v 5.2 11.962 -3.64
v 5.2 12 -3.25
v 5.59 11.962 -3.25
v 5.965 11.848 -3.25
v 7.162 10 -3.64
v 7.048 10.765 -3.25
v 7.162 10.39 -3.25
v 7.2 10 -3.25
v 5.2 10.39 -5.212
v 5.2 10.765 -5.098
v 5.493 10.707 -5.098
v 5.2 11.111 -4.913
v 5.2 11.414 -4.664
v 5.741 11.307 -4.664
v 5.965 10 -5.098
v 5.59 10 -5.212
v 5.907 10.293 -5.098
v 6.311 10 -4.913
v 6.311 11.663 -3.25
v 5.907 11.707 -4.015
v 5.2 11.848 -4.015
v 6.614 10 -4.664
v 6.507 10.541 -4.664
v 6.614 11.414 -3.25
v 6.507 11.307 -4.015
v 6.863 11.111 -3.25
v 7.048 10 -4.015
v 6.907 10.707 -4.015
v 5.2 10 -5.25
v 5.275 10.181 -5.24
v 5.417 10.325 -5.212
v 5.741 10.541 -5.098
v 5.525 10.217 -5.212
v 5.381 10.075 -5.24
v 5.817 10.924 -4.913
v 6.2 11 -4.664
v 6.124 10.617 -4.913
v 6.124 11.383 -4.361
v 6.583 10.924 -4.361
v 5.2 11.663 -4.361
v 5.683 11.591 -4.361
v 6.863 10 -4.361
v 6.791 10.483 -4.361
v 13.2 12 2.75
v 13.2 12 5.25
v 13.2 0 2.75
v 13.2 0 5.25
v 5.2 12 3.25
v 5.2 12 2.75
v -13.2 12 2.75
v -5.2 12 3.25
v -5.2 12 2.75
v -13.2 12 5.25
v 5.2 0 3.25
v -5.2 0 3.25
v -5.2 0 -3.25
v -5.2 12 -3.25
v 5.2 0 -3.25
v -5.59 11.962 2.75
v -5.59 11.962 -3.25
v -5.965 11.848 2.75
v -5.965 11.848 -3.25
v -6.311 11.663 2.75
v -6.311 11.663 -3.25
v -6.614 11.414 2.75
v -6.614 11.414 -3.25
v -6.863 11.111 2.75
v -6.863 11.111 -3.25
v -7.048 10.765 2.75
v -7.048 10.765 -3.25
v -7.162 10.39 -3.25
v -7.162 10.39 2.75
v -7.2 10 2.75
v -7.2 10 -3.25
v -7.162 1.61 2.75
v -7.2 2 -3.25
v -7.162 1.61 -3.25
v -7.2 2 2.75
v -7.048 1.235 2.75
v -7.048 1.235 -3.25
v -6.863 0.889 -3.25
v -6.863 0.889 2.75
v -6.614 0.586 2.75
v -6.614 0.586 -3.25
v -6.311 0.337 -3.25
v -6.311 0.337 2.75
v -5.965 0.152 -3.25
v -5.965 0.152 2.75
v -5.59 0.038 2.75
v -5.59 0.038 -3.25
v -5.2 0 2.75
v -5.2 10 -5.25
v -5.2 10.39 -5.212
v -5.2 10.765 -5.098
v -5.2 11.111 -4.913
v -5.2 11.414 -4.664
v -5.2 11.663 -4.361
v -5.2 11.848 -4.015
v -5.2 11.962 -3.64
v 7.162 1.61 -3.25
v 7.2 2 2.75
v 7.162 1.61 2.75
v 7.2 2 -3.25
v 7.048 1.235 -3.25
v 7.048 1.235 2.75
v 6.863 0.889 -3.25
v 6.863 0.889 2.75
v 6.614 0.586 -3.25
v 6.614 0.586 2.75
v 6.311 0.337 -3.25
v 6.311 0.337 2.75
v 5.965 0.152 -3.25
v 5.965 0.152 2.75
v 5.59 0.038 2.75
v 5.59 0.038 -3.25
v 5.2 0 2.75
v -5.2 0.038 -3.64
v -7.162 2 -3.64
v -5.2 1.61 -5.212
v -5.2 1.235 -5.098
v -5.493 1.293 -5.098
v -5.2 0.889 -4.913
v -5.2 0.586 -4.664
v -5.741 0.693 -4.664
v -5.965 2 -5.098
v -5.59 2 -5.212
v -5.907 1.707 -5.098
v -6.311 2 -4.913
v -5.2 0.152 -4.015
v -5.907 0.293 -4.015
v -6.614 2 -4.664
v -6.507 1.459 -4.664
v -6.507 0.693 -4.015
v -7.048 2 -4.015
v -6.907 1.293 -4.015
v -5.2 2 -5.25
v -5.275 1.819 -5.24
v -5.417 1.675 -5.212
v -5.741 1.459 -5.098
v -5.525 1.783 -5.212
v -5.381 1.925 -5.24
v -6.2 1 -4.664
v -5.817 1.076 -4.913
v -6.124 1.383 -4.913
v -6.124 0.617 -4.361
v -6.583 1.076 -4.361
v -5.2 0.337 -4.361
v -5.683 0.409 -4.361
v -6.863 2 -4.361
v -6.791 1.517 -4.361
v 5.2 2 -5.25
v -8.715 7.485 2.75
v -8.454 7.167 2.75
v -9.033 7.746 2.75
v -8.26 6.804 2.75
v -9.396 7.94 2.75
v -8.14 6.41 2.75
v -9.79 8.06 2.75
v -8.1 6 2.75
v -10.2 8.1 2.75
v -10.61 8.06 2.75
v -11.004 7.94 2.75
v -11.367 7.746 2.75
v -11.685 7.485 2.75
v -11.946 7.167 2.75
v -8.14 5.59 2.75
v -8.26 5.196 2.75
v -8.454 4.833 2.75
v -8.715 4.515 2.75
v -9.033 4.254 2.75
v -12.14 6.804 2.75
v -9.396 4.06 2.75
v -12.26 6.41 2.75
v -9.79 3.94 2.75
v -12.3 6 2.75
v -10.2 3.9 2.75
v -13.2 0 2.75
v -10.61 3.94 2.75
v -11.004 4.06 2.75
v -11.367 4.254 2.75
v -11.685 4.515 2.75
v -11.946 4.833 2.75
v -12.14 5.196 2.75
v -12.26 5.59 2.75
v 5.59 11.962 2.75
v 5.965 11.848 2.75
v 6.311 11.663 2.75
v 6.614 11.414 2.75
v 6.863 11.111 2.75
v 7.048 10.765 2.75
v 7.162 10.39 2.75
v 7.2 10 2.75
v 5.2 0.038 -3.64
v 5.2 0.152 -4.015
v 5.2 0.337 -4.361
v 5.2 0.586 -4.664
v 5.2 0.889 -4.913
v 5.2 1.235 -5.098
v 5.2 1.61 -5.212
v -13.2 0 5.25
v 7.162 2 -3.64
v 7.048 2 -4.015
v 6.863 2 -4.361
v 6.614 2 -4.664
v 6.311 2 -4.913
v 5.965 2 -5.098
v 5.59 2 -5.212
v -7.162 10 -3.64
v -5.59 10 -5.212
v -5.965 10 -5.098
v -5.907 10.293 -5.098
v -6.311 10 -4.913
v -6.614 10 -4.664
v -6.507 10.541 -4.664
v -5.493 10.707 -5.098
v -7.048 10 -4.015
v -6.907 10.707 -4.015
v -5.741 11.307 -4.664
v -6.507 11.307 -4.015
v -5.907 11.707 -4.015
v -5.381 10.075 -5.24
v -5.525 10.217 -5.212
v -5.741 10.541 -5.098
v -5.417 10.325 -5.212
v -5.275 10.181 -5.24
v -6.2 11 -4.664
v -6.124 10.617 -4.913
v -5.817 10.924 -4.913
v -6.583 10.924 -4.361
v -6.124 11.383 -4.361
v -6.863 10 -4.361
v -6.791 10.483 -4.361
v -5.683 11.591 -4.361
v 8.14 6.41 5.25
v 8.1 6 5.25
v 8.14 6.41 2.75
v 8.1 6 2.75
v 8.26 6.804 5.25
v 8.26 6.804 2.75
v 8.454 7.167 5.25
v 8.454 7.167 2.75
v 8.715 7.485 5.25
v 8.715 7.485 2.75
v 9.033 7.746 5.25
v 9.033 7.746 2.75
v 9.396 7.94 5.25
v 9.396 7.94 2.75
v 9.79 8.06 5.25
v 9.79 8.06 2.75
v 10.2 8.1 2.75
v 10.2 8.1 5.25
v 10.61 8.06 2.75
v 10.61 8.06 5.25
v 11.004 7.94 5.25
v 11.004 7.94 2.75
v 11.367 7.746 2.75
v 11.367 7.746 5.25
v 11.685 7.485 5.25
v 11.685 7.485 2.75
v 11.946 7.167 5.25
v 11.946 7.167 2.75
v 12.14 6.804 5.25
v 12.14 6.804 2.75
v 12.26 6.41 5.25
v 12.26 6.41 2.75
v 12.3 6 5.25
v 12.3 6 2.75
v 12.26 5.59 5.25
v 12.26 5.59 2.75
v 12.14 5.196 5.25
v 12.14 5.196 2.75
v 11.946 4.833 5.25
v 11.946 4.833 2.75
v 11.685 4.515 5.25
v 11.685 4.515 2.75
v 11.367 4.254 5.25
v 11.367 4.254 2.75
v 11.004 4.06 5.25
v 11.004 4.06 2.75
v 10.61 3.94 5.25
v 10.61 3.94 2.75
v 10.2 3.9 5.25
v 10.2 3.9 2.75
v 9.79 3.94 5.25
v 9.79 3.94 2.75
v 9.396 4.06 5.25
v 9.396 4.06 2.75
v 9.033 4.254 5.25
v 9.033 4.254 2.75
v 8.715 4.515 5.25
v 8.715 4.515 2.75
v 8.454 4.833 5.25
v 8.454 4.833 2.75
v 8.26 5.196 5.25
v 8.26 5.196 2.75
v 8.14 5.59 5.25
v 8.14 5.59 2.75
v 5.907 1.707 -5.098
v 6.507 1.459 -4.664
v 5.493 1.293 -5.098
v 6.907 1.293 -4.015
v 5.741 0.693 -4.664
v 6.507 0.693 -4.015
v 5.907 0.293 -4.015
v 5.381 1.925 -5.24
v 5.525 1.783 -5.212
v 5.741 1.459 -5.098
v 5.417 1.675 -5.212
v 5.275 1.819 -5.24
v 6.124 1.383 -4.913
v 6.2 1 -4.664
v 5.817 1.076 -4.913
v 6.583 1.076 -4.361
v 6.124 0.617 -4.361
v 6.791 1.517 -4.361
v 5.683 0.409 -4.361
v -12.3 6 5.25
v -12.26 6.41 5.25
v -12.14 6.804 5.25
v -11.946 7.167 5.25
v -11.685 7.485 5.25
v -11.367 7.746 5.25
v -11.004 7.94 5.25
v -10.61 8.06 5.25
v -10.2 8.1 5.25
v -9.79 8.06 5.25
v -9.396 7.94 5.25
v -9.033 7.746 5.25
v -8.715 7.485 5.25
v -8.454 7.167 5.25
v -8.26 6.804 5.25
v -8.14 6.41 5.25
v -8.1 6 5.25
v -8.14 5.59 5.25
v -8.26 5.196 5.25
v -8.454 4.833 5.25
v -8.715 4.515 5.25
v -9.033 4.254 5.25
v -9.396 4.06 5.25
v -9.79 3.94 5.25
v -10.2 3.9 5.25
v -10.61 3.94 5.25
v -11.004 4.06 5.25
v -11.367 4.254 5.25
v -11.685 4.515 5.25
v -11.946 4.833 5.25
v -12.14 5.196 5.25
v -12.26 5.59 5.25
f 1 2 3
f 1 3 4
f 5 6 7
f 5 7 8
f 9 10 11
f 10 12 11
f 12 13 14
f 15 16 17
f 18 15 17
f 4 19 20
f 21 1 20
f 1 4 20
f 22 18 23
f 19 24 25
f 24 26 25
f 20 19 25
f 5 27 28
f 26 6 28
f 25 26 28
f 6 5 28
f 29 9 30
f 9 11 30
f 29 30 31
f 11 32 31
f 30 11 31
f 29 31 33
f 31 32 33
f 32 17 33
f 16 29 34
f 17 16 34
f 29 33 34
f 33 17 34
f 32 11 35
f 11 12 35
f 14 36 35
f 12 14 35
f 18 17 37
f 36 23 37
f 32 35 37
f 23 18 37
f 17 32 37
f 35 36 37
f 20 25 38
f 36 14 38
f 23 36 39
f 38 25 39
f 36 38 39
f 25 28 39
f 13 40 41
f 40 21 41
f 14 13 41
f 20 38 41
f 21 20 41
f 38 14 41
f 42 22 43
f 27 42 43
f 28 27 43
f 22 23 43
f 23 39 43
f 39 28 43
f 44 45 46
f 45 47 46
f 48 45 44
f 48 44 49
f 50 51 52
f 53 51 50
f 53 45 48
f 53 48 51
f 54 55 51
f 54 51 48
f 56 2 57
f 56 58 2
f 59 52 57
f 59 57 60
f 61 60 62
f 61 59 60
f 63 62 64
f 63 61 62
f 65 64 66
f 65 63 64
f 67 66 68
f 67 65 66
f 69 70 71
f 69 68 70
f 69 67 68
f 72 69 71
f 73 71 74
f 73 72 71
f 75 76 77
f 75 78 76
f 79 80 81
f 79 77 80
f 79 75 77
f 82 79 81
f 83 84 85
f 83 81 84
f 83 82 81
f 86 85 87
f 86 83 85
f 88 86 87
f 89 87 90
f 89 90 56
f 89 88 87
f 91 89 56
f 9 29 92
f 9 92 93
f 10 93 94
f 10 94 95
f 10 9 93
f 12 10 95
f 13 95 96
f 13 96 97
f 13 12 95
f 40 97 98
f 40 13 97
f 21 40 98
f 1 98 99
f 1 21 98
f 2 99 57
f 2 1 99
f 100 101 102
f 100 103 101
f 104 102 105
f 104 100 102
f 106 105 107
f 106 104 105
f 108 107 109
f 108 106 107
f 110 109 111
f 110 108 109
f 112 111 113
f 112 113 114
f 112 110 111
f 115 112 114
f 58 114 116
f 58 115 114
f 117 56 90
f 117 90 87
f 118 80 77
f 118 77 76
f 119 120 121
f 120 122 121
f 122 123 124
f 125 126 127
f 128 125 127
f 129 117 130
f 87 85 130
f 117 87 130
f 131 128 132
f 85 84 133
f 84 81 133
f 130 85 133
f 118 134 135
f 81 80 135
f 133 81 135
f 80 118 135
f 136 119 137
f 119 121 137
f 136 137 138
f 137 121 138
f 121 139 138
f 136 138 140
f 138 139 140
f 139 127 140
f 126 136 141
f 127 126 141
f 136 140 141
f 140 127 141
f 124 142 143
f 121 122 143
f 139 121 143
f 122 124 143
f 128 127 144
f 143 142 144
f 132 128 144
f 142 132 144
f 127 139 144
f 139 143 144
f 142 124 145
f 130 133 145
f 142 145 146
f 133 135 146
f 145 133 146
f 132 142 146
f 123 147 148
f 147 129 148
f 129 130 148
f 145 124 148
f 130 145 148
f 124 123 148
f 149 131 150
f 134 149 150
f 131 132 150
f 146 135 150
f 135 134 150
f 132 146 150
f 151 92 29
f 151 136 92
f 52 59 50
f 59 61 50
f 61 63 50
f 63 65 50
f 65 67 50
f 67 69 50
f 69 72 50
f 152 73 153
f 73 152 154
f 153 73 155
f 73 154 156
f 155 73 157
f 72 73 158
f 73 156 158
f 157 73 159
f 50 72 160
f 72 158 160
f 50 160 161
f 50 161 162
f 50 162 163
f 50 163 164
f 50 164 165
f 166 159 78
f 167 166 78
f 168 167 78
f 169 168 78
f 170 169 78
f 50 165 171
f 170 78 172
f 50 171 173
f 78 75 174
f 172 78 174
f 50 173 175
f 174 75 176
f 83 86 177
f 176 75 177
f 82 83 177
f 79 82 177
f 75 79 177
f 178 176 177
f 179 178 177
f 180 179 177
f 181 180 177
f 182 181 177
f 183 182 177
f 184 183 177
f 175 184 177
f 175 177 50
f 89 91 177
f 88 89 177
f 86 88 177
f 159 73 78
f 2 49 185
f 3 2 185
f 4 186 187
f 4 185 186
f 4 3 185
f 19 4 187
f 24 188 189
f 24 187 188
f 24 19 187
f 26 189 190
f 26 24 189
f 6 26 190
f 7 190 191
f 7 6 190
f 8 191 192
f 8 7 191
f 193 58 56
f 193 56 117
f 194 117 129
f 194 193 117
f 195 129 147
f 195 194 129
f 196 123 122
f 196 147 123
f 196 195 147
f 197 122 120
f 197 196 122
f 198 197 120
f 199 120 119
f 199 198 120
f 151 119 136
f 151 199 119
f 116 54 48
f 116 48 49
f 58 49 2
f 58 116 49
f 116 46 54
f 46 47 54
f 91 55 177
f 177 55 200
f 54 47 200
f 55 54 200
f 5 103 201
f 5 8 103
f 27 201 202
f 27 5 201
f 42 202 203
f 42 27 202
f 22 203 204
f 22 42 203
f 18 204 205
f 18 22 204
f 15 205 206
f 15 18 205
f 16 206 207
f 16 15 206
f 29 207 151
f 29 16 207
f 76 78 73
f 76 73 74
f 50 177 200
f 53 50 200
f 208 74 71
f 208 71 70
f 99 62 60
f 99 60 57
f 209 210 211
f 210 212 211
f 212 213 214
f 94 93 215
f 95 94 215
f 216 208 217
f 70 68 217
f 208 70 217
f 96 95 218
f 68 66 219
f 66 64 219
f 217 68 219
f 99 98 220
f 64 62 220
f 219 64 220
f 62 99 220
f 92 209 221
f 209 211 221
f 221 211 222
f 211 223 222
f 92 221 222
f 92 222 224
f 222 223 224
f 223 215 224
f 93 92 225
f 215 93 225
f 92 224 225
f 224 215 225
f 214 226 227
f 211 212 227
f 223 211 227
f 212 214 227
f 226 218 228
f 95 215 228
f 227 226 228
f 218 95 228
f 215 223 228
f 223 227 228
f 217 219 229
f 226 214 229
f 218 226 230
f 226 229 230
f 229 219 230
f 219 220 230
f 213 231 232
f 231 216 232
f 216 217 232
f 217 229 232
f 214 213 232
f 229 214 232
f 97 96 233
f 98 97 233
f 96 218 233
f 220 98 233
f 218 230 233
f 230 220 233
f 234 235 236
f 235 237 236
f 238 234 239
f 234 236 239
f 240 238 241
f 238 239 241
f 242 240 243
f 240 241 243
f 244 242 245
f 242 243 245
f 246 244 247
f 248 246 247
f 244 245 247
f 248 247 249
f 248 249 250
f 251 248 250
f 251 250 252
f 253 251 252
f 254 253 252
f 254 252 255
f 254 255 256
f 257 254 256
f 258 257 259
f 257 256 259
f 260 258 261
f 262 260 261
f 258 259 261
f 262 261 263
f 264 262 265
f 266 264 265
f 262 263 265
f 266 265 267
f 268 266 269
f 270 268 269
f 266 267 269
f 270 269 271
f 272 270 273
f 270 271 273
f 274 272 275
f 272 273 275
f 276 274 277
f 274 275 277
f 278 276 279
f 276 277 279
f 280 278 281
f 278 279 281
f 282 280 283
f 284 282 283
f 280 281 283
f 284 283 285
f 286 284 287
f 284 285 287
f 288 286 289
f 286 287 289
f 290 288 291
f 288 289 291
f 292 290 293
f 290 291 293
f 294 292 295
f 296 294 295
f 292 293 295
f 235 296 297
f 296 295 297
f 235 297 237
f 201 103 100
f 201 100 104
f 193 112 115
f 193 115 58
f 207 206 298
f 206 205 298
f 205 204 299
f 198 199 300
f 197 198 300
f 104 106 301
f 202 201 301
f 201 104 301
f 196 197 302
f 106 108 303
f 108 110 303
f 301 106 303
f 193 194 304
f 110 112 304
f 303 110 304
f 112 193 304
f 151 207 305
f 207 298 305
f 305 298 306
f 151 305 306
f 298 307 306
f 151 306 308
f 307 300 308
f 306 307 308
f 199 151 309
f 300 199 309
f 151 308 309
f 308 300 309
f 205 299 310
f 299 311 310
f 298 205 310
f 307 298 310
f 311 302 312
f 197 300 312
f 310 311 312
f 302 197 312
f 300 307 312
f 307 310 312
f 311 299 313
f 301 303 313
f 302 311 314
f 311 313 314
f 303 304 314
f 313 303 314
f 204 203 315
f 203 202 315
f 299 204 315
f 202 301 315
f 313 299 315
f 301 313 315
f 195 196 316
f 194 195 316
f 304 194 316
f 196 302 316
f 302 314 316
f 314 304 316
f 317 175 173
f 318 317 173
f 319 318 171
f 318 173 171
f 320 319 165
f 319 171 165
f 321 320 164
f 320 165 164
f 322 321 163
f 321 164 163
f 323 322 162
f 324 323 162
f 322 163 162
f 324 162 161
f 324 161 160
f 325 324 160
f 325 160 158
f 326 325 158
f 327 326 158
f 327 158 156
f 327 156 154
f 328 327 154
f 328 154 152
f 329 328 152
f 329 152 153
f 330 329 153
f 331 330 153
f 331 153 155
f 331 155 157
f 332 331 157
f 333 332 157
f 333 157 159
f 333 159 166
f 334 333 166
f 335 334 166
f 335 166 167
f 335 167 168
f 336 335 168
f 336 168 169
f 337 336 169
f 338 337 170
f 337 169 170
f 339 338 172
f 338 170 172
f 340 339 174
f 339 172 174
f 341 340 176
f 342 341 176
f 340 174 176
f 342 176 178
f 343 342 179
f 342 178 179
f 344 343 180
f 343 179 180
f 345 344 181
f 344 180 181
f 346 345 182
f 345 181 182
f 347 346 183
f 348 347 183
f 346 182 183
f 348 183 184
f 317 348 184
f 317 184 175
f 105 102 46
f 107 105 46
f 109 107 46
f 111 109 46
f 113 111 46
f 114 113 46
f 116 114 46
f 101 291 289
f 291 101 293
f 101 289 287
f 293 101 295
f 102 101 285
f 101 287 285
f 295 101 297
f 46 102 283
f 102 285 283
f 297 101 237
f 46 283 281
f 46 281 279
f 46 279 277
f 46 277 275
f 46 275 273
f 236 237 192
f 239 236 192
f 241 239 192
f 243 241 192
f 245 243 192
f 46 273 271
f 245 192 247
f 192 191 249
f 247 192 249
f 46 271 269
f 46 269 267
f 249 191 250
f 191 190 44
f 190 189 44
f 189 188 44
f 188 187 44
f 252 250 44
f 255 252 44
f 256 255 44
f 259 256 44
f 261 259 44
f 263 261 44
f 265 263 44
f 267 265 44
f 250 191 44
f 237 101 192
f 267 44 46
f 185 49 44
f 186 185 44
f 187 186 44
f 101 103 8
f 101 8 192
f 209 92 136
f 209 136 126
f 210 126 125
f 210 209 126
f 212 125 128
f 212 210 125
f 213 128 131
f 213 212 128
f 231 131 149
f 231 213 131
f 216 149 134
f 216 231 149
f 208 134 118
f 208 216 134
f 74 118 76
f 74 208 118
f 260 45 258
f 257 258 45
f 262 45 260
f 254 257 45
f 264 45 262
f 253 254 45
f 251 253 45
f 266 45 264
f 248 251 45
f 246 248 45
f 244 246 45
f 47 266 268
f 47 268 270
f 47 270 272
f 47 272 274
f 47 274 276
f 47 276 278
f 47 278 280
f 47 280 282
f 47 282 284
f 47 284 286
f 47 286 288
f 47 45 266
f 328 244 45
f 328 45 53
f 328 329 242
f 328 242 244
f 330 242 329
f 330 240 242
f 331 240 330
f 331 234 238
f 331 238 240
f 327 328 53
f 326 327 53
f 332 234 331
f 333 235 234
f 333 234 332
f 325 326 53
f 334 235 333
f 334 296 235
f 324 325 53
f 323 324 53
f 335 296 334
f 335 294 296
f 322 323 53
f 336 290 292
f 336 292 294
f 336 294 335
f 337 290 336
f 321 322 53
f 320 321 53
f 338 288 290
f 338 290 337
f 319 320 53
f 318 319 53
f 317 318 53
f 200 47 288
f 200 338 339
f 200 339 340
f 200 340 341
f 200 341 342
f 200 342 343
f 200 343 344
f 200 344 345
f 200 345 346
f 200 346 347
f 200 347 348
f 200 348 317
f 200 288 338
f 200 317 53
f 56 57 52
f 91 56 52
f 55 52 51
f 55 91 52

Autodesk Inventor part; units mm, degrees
ref_plane "YZ Plane" through (0, 0, 0) normal (1, 0, 0) x (0, 1, 0)
ref_plane "XZ Plane" through (0, 0, 0) normal (0, 1, 0) x (-1, 0, 0)
ref_plane "XY Plane" through (0, 0, 0) normal (0, 0, 1) x (1, 0, 0)
sketch "Sketch1" plane through (0, 0, 0) normal (0, 1, 0) x (-1, 0, 0)
  line L0 (5.2, 3.25) -> (-5.2, 3.25)
  line L1 (-5.2, 3.25) -> (-5.2, -3.25)
  line L2 (-5.2, -3.25) -> (5.2, -3.25)
  line L3 (5.2, -3.25) -> (5.2, 3.25)
  line L4 (0, -3.25) -> (0, 3.25) construction
  line L5 (5.2, 0) -> (-5.2, 0) construction
  line L6 (7.2, -5.25) -> (-7.2, -5.25)
  line L7 (-7.2, -5.25) -> (-7.2, 5.25)
  line L8 (-7.2, 5.25) -> (7.2, 5.25)
  line L9 (7.2, 5.25) -> (7.2, -5.25)
  line L10 (-13.2, 2.75) -> (-7.2, 2.75)
  line L11 (-7.2, 2.75) -> (-7.2, 5.25)
  line L12 (-7.2, 5.25) -> (-13.2, 5.25)
  line L13 (-13.2, 5.25) -> (-13.2, 2.75)
  line L14 (7.2, 2.75) -> (13.2, 2.75)
  line L15 (13.2, 2.75) -> (13.2, 5.25)
  line L16 (13.2, 5.25) -> (7.2, 5.25)
  line L17 (7.2, 5.25) -> (7.2, 2.75)
  point P0 (0, 0)
  dimension "d0" = 10.4
  dimension "d1" = 6.5
  dimension "d4" = 2
  dimension "d5" = 2
  dimension "d6" = 2
  dimension "d7" = 2
  dimension "d8" = 2.5
  dimension "d9" = 2.5
  dimension "d10" = 6
  dimension "d11" = 6
extrude "Extrusion2" add sketch "Sketch1" along normal blind 12
sketch "Sketch2" plane through (13.2, 0, 2.75) normal (0, 0, -1) x (-1, 0, 0)
  line L0 (26.4, 0) -> (20.4, 0) construction
  line L1 (20.4, 0) -> (20.4, 12) construction
  line L2 (20.4, 12) -> (26.4, 12) construction
  line L3 (26.4, 12) -> (26.4, 0) construction
  line L4 (20.4, 0) -> (26.4, 0) construction
  line L5 (26.4, 0) -> (26.4, 12) construction
  line L6 (20.4, 0) -> (20.4, 12) construction
  line L7 (20.4, 12) -> (26.4, 12) construction
  line L8 (23.4, 0) -> (23.4, 12) construction
  line L9 (26.4, 6) -> (20.4, 6) construction
  circle A0 centre (15.4635, 5.7038) radius 3.0285
  circle A1 centre (23.4, 6) radius 2.1
  line L10 (13.2, -1.4538) -> (13.2, 18.2002) construction
  circle A2 centre (3, 6) radius 2.1
  point P0 (13.2, 0)
  point P1 (23.4, 6)
  dimension "d15" = 4.2
extrude "Extrusion3" cut sketch "Sketch2" against normal up to surface (2.5 mm away) contours A1 | A2
fillet "Fillet1" radius 2 4 edges at (7.2, 6, -5.25) (-7.2, 6, -5.25) (0, 12, -5.25) (0, 0, -5.25)
fillet "Fillet2" radius 2 8 edges at (-6.6142, 11.4142, -4.6642) (-7.2, 12, -0.25) (6.6142, 11.4142, -4.6642) (7.2, 12, -0.2501) (6.6142, 0.5858, -4.6642) (7.2, 0, -0.2501) (-6.6142, 0.5858, -4.6642) (-7.2, 0, -0.25)
equation "\"d5\" = d4"
equation "\"d6\" = d4"
equation "\"d7\" = d4"
equation "\"d9\" = d8"
equation "\"d10\" = d11"
properties part number "USBholder version 1"
